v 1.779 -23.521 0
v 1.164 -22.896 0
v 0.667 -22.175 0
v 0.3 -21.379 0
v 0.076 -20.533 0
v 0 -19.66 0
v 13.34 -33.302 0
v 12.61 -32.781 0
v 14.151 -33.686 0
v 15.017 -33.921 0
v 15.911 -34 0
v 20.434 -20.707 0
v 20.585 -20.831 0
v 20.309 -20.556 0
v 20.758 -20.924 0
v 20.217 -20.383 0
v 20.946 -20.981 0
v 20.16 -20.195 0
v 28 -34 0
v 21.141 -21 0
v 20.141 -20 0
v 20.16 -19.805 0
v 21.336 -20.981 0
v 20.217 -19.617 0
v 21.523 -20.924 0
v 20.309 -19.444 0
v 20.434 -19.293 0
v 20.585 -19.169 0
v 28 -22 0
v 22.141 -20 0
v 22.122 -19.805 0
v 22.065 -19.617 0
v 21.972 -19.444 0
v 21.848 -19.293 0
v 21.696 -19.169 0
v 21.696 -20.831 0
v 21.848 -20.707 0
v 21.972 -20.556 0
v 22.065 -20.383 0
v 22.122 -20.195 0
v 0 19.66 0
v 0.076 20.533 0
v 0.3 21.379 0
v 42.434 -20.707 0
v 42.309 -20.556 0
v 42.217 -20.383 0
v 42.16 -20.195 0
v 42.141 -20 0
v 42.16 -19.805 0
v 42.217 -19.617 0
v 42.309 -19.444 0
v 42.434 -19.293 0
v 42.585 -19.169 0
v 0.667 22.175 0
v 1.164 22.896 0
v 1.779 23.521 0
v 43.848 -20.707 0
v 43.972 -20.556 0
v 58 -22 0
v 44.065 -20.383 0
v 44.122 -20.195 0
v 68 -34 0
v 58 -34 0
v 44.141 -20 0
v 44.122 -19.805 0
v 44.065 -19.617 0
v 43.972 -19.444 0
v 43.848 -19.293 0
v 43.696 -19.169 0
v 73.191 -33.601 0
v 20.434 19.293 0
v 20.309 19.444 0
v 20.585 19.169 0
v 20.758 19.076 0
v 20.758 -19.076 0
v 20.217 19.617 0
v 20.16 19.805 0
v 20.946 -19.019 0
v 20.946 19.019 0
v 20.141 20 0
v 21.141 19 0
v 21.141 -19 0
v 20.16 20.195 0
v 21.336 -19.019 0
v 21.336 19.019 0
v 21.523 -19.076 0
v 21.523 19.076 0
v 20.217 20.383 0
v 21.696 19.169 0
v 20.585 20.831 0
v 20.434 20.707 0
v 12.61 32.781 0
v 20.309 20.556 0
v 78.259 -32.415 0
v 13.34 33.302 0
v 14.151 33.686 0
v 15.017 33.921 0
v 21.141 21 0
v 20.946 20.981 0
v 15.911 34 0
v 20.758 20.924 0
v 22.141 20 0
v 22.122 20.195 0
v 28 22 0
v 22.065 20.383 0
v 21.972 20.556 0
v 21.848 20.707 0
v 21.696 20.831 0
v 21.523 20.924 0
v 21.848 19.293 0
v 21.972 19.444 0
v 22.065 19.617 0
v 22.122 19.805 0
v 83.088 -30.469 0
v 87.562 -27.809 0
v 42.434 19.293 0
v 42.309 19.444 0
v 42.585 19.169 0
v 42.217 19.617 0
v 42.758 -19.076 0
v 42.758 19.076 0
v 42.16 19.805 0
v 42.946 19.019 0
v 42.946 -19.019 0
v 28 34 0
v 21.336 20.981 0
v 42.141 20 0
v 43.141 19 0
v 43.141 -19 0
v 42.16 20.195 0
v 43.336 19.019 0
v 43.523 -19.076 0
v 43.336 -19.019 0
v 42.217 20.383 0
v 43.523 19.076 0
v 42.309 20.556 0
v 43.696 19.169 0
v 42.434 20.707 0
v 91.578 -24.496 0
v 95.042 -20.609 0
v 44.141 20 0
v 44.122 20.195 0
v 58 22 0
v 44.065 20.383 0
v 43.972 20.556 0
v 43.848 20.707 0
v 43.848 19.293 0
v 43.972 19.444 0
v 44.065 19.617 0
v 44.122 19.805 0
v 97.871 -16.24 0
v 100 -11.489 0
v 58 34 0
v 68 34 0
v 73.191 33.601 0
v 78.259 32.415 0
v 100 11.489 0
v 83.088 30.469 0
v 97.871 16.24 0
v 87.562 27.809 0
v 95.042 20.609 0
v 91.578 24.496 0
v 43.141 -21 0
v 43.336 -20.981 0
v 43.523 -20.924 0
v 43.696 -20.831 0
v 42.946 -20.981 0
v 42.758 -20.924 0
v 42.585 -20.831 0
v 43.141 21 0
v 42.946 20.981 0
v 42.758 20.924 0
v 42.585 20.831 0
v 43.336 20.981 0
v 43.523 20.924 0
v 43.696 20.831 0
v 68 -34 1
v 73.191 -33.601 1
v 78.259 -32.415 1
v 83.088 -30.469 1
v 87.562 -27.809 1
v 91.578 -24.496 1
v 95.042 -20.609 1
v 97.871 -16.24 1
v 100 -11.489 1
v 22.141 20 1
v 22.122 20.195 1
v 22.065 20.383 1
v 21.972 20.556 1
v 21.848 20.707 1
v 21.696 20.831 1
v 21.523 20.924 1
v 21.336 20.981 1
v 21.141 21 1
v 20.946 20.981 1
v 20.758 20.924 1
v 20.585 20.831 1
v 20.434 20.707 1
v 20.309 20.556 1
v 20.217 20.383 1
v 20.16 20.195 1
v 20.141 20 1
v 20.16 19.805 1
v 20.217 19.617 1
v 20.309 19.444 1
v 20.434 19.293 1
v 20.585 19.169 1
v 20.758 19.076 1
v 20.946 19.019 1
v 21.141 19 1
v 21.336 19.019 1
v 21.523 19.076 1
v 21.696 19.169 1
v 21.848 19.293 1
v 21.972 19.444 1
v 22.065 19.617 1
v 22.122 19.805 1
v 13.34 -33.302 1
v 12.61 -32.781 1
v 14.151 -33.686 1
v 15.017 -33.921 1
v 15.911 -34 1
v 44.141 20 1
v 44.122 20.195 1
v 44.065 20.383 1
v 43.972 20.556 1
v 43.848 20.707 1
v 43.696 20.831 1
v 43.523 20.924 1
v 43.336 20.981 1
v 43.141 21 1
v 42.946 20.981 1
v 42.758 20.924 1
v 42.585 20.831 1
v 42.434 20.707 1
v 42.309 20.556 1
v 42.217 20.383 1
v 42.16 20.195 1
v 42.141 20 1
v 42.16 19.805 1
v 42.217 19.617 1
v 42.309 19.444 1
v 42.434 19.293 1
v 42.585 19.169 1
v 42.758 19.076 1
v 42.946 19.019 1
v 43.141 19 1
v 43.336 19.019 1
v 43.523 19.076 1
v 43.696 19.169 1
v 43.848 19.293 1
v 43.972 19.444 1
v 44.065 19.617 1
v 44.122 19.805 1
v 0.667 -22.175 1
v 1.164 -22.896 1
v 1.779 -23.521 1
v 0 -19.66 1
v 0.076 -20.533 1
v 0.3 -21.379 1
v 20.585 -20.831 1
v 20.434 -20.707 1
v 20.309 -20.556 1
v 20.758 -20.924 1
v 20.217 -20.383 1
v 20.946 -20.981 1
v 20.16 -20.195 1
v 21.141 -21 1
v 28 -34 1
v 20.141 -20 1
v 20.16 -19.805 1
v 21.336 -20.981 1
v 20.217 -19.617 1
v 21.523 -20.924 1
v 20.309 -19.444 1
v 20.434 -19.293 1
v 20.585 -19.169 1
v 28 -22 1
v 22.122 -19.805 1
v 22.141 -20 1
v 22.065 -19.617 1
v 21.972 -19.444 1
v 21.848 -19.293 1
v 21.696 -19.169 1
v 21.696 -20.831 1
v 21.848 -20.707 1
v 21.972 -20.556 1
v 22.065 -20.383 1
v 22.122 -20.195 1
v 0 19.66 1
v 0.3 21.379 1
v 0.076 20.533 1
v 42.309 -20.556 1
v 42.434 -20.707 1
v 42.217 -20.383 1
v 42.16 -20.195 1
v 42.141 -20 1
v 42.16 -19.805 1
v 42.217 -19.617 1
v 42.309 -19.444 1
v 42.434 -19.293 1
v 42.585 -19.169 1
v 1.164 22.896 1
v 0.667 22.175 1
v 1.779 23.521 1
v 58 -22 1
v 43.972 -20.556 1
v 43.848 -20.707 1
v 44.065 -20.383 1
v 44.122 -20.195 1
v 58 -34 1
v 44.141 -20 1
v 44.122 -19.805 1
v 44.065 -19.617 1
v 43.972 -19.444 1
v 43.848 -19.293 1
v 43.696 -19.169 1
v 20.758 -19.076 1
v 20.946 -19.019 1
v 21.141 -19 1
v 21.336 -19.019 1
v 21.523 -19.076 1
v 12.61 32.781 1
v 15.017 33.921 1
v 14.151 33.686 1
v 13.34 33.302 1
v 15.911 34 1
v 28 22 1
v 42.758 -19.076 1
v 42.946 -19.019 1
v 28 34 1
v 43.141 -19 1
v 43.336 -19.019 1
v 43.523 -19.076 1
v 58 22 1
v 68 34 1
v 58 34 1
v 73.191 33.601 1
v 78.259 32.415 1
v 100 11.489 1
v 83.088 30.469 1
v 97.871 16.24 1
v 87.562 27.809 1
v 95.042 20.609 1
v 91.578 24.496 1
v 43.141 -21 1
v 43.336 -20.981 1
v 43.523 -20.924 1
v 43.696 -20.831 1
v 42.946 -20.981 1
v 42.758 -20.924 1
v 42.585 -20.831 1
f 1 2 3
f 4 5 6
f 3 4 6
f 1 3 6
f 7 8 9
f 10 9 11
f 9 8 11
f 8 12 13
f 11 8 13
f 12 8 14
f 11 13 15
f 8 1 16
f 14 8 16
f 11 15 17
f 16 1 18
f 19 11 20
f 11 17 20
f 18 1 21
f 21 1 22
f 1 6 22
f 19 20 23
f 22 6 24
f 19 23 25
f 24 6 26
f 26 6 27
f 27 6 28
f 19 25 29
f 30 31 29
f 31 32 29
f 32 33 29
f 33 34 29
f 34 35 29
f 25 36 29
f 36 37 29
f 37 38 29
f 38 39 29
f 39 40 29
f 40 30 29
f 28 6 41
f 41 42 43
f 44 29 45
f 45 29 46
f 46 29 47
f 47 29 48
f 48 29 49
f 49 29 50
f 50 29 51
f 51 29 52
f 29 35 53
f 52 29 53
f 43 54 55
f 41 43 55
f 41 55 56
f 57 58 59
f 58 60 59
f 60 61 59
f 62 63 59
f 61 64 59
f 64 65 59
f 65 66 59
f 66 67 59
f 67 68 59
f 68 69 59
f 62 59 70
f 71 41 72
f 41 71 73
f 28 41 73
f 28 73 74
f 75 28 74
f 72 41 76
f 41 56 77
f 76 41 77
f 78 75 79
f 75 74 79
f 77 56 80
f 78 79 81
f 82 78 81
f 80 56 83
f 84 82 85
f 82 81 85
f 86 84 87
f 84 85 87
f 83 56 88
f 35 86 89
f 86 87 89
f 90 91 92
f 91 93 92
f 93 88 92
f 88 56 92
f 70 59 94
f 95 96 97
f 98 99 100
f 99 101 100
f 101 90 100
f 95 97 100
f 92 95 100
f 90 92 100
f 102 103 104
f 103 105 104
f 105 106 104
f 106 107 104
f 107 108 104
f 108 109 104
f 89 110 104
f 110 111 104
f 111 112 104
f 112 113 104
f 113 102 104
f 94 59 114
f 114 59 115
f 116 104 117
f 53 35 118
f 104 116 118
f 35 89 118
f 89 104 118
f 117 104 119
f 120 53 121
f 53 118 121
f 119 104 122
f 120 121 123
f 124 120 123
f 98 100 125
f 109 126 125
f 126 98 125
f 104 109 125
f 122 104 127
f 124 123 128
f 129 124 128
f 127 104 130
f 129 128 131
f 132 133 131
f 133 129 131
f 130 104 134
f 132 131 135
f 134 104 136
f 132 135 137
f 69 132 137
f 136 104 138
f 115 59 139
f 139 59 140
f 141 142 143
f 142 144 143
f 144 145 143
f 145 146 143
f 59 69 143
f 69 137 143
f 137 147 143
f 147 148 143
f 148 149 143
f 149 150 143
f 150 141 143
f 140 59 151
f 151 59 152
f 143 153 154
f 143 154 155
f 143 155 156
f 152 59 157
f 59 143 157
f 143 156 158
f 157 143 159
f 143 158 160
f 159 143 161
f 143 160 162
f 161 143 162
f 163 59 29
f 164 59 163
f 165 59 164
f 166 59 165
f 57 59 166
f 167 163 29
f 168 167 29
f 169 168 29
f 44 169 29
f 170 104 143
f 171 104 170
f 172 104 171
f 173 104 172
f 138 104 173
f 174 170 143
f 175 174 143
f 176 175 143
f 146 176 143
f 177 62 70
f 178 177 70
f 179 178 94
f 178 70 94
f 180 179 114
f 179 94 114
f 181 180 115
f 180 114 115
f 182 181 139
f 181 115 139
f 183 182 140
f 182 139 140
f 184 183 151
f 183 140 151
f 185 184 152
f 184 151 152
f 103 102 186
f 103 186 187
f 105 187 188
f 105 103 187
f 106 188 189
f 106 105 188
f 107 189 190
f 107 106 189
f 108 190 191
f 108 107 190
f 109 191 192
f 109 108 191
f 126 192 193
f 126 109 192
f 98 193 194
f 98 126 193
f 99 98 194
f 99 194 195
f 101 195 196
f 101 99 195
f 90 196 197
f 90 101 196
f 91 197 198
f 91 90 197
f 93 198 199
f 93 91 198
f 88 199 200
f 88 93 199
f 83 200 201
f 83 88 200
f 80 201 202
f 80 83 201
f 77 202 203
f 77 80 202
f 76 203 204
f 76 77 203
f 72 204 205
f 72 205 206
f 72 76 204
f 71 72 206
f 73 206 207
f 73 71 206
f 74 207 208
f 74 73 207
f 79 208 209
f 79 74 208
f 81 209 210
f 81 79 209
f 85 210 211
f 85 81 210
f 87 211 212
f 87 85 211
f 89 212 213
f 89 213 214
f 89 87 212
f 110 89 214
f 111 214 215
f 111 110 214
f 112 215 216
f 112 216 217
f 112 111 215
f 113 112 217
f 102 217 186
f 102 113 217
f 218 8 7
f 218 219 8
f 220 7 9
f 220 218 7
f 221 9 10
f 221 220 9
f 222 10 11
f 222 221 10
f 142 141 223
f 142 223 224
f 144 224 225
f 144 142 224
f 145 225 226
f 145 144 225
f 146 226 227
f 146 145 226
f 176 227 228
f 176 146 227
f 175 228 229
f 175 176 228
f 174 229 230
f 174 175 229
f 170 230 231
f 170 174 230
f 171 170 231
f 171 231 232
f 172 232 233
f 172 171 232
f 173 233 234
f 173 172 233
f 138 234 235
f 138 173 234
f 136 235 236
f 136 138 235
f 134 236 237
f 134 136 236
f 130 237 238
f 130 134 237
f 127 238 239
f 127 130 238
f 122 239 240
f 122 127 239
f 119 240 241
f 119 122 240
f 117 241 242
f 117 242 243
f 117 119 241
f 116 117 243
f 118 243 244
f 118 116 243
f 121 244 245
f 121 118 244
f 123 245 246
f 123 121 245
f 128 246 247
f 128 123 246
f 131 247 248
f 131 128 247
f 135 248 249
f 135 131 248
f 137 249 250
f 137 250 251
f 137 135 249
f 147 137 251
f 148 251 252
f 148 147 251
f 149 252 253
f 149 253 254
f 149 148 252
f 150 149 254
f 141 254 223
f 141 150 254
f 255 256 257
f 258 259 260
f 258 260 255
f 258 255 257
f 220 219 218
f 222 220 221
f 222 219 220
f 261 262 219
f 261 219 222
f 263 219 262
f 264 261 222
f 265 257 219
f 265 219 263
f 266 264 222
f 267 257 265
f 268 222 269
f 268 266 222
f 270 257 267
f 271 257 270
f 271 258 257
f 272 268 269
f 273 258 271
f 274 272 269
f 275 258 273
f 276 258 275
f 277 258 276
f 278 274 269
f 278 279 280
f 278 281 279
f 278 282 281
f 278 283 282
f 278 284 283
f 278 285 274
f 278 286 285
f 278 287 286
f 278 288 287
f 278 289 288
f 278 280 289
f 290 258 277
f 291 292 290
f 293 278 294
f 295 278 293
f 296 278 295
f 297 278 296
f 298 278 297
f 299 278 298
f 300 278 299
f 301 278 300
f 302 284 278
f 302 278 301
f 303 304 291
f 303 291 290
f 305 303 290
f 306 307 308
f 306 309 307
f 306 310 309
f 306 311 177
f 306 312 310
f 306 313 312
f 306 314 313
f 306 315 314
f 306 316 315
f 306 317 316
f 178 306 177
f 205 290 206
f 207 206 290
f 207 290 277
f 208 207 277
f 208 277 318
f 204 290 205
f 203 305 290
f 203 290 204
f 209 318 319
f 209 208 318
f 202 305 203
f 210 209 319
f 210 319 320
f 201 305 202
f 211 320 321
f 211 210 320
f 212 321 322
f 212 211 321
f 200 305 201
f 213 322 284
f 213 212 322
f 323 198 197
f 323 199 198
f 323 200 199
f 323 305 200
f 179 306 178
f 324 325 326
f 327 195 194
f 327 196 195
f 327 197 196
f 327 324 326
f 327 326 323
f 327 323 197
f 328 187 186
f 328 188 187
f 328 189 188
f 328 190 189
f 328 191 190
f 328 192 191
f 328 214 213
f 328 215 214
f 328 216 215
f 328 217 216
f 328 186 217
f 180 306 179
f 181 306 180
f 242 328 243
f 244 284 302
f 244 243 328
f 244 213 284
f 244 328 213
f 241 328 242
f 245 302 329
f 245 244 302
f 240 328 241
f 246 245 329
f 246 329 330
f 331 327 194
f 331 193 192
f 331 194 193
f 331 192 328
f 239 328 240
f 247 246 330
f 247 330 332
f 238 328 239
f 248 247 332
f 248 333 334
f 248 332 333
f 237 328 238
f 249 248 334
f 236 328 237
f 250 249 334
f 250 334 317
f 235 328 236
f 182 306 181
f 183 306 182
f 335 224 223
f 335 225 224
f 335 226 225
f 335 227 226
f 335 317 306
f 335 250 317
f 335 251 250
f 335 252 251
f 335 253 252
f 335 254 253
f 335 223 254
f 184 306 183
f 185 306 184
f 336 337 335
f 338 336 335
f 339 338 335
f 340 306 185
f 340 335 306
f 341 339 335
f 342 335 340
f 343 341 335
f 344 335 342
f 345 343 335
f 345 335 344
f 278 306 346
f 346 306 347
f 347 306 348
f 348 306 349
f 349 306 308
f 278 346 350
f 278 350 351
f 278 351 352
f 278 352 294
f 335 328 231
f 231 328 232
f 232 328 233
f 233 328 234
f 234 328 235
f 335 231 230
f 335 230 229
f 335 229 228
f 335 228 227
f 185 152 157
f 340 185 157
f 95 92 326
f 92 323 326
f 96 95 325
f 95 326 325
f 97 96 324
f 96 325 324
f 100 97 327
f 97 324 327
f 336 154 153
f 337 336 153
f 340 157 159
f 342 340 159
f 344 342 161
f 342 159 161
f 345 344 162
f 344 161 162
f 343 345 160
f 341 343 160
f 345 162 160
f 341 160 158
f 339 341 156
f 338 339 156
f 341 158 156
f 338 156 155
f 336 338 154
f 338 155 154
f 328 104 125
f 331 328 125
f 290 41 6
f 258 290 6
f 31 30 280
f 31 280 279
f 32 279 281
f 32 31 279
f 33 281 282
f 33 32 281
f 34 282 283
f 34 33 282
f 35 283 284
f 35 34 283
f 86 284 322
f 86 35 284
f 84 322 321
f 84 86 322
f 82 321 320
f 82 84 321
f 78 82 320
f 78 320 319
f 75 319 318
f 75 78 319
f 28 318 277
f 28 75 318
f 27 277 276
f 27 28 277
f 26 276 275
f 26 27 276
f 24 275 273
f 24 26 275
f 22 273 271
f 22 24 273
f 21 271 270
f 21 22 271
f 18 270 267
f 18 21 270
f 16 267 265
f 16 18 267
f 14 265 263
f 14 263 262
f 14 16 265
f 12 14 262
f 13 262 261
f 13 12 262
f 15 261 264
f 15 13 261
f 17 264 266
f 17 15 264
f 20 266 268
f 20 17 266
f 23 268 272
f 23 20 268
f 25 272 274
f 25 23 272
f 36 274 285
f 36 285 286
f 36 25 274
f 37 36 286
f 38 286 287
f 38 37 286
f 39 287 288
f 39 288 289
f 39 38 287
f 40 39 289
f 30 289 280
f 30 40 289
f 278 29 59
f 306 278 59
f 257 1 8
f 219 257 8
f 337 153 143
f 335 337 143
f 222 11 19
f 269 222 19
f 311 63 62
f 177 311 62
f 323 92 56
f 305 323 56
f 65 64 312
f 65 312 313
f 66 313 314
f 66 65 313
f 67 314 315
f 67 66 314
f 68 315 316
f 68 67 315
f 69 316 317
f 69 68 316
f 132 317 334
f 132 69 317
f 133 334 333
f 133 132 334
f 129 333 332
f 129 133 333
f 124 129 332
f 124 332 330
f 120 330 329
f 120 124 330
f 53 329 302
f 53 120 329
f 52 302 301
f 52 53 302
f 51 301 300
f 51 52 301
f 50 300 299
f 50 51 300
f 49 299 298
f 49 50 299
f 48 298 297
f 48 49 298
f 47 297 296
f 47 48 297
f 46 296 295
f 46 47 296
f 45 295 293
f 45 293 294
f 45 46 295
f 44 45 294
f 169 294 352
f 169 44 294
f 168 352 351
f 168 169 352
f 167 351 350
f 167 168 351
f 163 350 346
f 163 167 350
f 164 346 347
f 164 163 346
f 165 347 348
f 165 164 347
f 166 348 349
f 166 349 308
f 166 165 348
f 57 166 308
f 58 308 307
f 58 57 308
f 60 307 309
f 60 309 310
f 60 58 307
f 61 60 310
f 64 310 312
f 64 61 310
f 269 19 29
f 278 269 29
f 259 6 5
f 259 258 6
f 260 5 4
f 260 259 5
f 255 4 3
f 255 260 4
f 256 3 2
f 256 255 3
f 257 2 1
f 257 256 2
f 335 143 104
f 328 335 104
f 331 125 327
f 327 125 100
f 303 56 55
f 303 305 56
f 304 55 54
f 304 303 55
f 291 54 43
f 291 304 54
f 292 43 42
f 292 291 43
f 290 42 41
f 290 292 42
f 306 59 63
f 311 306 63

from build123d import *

# Parameters (mm, degrees)
F0_R     = 1
F1_DEPTH = 1
F2_R     = 5.08
F3_R     = 5.08
F4_R     = 5.08
F5_R     = 5.08


with BuildPart() as f1:
    # F0 (on Top) → F1 (new body)
    with BuildSketch(Plane.XY):
        with BuildLine():
            Line((0, 22), (0, 0))
            Line((0, 0), (0, -22))
            Line((0, -22), (14.035148, -34))
            Line((14.035148, -34), (27.999999, -34))
            Line((27.999999, -34), (27.999999, -22))
            Line((27.999999, -22), (57.999999, -22))
            Line((57.999999, -22), (57.999999, -34))
            Line((57.999999, -34), (67.999999, -34))
            ThreePointArc((67.999999, -34), (87.562333, -27.808544), (100, -11.489123))
            Line((100, -11.489123), (100, 11.489123))
            ThreePointArc((100, 11.489123), (87.562333, 27.808544), (67.999999, 34))
            Line((67.999999, 34), (57.999999, 34))
            Line((57.999999, 34), (57.999999, 22))
            Line((57.999999, 22), (27.999999, 22))
            Line((27.999999, 22), (27.999999, 34))
            Line((27.999999, 34), (14.035148, 34))
            Line((14.035148, 34), (0, 22))
        make_face()
        with Locations((21.140715, -20)):
            Circle(F0_R, mode=Mode.SUBTRACT)
        with Locations((43.140715, -20)):
            Circle(F0_R, mode=Mode.SUBTRACT)
        with Locations((21.140715, 20)):
            Circle(F0_R, mode=Mode.SUBTRACT)
        with Locations((43.140715, 20)):
            Circle(F0_R, mode=Mode.SUBTRACT)
    extrude(amount=F1_DEPTH)

    # F2
    f2_edges = [f1.edges().sort_by_distance(p)[0] for p in [
        (14.035148, 34, 0.5),
    ]]
    fillet(f2_edges, radius=F2_R)

    # F3
    f3_edges = [f1.edges().sort_by_distance(p)[0] for p in [
        (0, 22, 0.5),
    ]]
    fillet(f3_edges, radius=F3_R)

    # F4
    f4_edges = [f1.edges().sort_by_distance(p)[0] for p in [
        (0, -22, 0.5),
    ]]
    fillet(f4_edges, radius=F4_R)

    # F5
    f5_edges = [f1.edges().sort_by_distance(p)[0] for p in [
        (14.035148, -34, 0.5),
    ]]
    fillet(f5_edges, radius=F5_R)


solid = f1.part
